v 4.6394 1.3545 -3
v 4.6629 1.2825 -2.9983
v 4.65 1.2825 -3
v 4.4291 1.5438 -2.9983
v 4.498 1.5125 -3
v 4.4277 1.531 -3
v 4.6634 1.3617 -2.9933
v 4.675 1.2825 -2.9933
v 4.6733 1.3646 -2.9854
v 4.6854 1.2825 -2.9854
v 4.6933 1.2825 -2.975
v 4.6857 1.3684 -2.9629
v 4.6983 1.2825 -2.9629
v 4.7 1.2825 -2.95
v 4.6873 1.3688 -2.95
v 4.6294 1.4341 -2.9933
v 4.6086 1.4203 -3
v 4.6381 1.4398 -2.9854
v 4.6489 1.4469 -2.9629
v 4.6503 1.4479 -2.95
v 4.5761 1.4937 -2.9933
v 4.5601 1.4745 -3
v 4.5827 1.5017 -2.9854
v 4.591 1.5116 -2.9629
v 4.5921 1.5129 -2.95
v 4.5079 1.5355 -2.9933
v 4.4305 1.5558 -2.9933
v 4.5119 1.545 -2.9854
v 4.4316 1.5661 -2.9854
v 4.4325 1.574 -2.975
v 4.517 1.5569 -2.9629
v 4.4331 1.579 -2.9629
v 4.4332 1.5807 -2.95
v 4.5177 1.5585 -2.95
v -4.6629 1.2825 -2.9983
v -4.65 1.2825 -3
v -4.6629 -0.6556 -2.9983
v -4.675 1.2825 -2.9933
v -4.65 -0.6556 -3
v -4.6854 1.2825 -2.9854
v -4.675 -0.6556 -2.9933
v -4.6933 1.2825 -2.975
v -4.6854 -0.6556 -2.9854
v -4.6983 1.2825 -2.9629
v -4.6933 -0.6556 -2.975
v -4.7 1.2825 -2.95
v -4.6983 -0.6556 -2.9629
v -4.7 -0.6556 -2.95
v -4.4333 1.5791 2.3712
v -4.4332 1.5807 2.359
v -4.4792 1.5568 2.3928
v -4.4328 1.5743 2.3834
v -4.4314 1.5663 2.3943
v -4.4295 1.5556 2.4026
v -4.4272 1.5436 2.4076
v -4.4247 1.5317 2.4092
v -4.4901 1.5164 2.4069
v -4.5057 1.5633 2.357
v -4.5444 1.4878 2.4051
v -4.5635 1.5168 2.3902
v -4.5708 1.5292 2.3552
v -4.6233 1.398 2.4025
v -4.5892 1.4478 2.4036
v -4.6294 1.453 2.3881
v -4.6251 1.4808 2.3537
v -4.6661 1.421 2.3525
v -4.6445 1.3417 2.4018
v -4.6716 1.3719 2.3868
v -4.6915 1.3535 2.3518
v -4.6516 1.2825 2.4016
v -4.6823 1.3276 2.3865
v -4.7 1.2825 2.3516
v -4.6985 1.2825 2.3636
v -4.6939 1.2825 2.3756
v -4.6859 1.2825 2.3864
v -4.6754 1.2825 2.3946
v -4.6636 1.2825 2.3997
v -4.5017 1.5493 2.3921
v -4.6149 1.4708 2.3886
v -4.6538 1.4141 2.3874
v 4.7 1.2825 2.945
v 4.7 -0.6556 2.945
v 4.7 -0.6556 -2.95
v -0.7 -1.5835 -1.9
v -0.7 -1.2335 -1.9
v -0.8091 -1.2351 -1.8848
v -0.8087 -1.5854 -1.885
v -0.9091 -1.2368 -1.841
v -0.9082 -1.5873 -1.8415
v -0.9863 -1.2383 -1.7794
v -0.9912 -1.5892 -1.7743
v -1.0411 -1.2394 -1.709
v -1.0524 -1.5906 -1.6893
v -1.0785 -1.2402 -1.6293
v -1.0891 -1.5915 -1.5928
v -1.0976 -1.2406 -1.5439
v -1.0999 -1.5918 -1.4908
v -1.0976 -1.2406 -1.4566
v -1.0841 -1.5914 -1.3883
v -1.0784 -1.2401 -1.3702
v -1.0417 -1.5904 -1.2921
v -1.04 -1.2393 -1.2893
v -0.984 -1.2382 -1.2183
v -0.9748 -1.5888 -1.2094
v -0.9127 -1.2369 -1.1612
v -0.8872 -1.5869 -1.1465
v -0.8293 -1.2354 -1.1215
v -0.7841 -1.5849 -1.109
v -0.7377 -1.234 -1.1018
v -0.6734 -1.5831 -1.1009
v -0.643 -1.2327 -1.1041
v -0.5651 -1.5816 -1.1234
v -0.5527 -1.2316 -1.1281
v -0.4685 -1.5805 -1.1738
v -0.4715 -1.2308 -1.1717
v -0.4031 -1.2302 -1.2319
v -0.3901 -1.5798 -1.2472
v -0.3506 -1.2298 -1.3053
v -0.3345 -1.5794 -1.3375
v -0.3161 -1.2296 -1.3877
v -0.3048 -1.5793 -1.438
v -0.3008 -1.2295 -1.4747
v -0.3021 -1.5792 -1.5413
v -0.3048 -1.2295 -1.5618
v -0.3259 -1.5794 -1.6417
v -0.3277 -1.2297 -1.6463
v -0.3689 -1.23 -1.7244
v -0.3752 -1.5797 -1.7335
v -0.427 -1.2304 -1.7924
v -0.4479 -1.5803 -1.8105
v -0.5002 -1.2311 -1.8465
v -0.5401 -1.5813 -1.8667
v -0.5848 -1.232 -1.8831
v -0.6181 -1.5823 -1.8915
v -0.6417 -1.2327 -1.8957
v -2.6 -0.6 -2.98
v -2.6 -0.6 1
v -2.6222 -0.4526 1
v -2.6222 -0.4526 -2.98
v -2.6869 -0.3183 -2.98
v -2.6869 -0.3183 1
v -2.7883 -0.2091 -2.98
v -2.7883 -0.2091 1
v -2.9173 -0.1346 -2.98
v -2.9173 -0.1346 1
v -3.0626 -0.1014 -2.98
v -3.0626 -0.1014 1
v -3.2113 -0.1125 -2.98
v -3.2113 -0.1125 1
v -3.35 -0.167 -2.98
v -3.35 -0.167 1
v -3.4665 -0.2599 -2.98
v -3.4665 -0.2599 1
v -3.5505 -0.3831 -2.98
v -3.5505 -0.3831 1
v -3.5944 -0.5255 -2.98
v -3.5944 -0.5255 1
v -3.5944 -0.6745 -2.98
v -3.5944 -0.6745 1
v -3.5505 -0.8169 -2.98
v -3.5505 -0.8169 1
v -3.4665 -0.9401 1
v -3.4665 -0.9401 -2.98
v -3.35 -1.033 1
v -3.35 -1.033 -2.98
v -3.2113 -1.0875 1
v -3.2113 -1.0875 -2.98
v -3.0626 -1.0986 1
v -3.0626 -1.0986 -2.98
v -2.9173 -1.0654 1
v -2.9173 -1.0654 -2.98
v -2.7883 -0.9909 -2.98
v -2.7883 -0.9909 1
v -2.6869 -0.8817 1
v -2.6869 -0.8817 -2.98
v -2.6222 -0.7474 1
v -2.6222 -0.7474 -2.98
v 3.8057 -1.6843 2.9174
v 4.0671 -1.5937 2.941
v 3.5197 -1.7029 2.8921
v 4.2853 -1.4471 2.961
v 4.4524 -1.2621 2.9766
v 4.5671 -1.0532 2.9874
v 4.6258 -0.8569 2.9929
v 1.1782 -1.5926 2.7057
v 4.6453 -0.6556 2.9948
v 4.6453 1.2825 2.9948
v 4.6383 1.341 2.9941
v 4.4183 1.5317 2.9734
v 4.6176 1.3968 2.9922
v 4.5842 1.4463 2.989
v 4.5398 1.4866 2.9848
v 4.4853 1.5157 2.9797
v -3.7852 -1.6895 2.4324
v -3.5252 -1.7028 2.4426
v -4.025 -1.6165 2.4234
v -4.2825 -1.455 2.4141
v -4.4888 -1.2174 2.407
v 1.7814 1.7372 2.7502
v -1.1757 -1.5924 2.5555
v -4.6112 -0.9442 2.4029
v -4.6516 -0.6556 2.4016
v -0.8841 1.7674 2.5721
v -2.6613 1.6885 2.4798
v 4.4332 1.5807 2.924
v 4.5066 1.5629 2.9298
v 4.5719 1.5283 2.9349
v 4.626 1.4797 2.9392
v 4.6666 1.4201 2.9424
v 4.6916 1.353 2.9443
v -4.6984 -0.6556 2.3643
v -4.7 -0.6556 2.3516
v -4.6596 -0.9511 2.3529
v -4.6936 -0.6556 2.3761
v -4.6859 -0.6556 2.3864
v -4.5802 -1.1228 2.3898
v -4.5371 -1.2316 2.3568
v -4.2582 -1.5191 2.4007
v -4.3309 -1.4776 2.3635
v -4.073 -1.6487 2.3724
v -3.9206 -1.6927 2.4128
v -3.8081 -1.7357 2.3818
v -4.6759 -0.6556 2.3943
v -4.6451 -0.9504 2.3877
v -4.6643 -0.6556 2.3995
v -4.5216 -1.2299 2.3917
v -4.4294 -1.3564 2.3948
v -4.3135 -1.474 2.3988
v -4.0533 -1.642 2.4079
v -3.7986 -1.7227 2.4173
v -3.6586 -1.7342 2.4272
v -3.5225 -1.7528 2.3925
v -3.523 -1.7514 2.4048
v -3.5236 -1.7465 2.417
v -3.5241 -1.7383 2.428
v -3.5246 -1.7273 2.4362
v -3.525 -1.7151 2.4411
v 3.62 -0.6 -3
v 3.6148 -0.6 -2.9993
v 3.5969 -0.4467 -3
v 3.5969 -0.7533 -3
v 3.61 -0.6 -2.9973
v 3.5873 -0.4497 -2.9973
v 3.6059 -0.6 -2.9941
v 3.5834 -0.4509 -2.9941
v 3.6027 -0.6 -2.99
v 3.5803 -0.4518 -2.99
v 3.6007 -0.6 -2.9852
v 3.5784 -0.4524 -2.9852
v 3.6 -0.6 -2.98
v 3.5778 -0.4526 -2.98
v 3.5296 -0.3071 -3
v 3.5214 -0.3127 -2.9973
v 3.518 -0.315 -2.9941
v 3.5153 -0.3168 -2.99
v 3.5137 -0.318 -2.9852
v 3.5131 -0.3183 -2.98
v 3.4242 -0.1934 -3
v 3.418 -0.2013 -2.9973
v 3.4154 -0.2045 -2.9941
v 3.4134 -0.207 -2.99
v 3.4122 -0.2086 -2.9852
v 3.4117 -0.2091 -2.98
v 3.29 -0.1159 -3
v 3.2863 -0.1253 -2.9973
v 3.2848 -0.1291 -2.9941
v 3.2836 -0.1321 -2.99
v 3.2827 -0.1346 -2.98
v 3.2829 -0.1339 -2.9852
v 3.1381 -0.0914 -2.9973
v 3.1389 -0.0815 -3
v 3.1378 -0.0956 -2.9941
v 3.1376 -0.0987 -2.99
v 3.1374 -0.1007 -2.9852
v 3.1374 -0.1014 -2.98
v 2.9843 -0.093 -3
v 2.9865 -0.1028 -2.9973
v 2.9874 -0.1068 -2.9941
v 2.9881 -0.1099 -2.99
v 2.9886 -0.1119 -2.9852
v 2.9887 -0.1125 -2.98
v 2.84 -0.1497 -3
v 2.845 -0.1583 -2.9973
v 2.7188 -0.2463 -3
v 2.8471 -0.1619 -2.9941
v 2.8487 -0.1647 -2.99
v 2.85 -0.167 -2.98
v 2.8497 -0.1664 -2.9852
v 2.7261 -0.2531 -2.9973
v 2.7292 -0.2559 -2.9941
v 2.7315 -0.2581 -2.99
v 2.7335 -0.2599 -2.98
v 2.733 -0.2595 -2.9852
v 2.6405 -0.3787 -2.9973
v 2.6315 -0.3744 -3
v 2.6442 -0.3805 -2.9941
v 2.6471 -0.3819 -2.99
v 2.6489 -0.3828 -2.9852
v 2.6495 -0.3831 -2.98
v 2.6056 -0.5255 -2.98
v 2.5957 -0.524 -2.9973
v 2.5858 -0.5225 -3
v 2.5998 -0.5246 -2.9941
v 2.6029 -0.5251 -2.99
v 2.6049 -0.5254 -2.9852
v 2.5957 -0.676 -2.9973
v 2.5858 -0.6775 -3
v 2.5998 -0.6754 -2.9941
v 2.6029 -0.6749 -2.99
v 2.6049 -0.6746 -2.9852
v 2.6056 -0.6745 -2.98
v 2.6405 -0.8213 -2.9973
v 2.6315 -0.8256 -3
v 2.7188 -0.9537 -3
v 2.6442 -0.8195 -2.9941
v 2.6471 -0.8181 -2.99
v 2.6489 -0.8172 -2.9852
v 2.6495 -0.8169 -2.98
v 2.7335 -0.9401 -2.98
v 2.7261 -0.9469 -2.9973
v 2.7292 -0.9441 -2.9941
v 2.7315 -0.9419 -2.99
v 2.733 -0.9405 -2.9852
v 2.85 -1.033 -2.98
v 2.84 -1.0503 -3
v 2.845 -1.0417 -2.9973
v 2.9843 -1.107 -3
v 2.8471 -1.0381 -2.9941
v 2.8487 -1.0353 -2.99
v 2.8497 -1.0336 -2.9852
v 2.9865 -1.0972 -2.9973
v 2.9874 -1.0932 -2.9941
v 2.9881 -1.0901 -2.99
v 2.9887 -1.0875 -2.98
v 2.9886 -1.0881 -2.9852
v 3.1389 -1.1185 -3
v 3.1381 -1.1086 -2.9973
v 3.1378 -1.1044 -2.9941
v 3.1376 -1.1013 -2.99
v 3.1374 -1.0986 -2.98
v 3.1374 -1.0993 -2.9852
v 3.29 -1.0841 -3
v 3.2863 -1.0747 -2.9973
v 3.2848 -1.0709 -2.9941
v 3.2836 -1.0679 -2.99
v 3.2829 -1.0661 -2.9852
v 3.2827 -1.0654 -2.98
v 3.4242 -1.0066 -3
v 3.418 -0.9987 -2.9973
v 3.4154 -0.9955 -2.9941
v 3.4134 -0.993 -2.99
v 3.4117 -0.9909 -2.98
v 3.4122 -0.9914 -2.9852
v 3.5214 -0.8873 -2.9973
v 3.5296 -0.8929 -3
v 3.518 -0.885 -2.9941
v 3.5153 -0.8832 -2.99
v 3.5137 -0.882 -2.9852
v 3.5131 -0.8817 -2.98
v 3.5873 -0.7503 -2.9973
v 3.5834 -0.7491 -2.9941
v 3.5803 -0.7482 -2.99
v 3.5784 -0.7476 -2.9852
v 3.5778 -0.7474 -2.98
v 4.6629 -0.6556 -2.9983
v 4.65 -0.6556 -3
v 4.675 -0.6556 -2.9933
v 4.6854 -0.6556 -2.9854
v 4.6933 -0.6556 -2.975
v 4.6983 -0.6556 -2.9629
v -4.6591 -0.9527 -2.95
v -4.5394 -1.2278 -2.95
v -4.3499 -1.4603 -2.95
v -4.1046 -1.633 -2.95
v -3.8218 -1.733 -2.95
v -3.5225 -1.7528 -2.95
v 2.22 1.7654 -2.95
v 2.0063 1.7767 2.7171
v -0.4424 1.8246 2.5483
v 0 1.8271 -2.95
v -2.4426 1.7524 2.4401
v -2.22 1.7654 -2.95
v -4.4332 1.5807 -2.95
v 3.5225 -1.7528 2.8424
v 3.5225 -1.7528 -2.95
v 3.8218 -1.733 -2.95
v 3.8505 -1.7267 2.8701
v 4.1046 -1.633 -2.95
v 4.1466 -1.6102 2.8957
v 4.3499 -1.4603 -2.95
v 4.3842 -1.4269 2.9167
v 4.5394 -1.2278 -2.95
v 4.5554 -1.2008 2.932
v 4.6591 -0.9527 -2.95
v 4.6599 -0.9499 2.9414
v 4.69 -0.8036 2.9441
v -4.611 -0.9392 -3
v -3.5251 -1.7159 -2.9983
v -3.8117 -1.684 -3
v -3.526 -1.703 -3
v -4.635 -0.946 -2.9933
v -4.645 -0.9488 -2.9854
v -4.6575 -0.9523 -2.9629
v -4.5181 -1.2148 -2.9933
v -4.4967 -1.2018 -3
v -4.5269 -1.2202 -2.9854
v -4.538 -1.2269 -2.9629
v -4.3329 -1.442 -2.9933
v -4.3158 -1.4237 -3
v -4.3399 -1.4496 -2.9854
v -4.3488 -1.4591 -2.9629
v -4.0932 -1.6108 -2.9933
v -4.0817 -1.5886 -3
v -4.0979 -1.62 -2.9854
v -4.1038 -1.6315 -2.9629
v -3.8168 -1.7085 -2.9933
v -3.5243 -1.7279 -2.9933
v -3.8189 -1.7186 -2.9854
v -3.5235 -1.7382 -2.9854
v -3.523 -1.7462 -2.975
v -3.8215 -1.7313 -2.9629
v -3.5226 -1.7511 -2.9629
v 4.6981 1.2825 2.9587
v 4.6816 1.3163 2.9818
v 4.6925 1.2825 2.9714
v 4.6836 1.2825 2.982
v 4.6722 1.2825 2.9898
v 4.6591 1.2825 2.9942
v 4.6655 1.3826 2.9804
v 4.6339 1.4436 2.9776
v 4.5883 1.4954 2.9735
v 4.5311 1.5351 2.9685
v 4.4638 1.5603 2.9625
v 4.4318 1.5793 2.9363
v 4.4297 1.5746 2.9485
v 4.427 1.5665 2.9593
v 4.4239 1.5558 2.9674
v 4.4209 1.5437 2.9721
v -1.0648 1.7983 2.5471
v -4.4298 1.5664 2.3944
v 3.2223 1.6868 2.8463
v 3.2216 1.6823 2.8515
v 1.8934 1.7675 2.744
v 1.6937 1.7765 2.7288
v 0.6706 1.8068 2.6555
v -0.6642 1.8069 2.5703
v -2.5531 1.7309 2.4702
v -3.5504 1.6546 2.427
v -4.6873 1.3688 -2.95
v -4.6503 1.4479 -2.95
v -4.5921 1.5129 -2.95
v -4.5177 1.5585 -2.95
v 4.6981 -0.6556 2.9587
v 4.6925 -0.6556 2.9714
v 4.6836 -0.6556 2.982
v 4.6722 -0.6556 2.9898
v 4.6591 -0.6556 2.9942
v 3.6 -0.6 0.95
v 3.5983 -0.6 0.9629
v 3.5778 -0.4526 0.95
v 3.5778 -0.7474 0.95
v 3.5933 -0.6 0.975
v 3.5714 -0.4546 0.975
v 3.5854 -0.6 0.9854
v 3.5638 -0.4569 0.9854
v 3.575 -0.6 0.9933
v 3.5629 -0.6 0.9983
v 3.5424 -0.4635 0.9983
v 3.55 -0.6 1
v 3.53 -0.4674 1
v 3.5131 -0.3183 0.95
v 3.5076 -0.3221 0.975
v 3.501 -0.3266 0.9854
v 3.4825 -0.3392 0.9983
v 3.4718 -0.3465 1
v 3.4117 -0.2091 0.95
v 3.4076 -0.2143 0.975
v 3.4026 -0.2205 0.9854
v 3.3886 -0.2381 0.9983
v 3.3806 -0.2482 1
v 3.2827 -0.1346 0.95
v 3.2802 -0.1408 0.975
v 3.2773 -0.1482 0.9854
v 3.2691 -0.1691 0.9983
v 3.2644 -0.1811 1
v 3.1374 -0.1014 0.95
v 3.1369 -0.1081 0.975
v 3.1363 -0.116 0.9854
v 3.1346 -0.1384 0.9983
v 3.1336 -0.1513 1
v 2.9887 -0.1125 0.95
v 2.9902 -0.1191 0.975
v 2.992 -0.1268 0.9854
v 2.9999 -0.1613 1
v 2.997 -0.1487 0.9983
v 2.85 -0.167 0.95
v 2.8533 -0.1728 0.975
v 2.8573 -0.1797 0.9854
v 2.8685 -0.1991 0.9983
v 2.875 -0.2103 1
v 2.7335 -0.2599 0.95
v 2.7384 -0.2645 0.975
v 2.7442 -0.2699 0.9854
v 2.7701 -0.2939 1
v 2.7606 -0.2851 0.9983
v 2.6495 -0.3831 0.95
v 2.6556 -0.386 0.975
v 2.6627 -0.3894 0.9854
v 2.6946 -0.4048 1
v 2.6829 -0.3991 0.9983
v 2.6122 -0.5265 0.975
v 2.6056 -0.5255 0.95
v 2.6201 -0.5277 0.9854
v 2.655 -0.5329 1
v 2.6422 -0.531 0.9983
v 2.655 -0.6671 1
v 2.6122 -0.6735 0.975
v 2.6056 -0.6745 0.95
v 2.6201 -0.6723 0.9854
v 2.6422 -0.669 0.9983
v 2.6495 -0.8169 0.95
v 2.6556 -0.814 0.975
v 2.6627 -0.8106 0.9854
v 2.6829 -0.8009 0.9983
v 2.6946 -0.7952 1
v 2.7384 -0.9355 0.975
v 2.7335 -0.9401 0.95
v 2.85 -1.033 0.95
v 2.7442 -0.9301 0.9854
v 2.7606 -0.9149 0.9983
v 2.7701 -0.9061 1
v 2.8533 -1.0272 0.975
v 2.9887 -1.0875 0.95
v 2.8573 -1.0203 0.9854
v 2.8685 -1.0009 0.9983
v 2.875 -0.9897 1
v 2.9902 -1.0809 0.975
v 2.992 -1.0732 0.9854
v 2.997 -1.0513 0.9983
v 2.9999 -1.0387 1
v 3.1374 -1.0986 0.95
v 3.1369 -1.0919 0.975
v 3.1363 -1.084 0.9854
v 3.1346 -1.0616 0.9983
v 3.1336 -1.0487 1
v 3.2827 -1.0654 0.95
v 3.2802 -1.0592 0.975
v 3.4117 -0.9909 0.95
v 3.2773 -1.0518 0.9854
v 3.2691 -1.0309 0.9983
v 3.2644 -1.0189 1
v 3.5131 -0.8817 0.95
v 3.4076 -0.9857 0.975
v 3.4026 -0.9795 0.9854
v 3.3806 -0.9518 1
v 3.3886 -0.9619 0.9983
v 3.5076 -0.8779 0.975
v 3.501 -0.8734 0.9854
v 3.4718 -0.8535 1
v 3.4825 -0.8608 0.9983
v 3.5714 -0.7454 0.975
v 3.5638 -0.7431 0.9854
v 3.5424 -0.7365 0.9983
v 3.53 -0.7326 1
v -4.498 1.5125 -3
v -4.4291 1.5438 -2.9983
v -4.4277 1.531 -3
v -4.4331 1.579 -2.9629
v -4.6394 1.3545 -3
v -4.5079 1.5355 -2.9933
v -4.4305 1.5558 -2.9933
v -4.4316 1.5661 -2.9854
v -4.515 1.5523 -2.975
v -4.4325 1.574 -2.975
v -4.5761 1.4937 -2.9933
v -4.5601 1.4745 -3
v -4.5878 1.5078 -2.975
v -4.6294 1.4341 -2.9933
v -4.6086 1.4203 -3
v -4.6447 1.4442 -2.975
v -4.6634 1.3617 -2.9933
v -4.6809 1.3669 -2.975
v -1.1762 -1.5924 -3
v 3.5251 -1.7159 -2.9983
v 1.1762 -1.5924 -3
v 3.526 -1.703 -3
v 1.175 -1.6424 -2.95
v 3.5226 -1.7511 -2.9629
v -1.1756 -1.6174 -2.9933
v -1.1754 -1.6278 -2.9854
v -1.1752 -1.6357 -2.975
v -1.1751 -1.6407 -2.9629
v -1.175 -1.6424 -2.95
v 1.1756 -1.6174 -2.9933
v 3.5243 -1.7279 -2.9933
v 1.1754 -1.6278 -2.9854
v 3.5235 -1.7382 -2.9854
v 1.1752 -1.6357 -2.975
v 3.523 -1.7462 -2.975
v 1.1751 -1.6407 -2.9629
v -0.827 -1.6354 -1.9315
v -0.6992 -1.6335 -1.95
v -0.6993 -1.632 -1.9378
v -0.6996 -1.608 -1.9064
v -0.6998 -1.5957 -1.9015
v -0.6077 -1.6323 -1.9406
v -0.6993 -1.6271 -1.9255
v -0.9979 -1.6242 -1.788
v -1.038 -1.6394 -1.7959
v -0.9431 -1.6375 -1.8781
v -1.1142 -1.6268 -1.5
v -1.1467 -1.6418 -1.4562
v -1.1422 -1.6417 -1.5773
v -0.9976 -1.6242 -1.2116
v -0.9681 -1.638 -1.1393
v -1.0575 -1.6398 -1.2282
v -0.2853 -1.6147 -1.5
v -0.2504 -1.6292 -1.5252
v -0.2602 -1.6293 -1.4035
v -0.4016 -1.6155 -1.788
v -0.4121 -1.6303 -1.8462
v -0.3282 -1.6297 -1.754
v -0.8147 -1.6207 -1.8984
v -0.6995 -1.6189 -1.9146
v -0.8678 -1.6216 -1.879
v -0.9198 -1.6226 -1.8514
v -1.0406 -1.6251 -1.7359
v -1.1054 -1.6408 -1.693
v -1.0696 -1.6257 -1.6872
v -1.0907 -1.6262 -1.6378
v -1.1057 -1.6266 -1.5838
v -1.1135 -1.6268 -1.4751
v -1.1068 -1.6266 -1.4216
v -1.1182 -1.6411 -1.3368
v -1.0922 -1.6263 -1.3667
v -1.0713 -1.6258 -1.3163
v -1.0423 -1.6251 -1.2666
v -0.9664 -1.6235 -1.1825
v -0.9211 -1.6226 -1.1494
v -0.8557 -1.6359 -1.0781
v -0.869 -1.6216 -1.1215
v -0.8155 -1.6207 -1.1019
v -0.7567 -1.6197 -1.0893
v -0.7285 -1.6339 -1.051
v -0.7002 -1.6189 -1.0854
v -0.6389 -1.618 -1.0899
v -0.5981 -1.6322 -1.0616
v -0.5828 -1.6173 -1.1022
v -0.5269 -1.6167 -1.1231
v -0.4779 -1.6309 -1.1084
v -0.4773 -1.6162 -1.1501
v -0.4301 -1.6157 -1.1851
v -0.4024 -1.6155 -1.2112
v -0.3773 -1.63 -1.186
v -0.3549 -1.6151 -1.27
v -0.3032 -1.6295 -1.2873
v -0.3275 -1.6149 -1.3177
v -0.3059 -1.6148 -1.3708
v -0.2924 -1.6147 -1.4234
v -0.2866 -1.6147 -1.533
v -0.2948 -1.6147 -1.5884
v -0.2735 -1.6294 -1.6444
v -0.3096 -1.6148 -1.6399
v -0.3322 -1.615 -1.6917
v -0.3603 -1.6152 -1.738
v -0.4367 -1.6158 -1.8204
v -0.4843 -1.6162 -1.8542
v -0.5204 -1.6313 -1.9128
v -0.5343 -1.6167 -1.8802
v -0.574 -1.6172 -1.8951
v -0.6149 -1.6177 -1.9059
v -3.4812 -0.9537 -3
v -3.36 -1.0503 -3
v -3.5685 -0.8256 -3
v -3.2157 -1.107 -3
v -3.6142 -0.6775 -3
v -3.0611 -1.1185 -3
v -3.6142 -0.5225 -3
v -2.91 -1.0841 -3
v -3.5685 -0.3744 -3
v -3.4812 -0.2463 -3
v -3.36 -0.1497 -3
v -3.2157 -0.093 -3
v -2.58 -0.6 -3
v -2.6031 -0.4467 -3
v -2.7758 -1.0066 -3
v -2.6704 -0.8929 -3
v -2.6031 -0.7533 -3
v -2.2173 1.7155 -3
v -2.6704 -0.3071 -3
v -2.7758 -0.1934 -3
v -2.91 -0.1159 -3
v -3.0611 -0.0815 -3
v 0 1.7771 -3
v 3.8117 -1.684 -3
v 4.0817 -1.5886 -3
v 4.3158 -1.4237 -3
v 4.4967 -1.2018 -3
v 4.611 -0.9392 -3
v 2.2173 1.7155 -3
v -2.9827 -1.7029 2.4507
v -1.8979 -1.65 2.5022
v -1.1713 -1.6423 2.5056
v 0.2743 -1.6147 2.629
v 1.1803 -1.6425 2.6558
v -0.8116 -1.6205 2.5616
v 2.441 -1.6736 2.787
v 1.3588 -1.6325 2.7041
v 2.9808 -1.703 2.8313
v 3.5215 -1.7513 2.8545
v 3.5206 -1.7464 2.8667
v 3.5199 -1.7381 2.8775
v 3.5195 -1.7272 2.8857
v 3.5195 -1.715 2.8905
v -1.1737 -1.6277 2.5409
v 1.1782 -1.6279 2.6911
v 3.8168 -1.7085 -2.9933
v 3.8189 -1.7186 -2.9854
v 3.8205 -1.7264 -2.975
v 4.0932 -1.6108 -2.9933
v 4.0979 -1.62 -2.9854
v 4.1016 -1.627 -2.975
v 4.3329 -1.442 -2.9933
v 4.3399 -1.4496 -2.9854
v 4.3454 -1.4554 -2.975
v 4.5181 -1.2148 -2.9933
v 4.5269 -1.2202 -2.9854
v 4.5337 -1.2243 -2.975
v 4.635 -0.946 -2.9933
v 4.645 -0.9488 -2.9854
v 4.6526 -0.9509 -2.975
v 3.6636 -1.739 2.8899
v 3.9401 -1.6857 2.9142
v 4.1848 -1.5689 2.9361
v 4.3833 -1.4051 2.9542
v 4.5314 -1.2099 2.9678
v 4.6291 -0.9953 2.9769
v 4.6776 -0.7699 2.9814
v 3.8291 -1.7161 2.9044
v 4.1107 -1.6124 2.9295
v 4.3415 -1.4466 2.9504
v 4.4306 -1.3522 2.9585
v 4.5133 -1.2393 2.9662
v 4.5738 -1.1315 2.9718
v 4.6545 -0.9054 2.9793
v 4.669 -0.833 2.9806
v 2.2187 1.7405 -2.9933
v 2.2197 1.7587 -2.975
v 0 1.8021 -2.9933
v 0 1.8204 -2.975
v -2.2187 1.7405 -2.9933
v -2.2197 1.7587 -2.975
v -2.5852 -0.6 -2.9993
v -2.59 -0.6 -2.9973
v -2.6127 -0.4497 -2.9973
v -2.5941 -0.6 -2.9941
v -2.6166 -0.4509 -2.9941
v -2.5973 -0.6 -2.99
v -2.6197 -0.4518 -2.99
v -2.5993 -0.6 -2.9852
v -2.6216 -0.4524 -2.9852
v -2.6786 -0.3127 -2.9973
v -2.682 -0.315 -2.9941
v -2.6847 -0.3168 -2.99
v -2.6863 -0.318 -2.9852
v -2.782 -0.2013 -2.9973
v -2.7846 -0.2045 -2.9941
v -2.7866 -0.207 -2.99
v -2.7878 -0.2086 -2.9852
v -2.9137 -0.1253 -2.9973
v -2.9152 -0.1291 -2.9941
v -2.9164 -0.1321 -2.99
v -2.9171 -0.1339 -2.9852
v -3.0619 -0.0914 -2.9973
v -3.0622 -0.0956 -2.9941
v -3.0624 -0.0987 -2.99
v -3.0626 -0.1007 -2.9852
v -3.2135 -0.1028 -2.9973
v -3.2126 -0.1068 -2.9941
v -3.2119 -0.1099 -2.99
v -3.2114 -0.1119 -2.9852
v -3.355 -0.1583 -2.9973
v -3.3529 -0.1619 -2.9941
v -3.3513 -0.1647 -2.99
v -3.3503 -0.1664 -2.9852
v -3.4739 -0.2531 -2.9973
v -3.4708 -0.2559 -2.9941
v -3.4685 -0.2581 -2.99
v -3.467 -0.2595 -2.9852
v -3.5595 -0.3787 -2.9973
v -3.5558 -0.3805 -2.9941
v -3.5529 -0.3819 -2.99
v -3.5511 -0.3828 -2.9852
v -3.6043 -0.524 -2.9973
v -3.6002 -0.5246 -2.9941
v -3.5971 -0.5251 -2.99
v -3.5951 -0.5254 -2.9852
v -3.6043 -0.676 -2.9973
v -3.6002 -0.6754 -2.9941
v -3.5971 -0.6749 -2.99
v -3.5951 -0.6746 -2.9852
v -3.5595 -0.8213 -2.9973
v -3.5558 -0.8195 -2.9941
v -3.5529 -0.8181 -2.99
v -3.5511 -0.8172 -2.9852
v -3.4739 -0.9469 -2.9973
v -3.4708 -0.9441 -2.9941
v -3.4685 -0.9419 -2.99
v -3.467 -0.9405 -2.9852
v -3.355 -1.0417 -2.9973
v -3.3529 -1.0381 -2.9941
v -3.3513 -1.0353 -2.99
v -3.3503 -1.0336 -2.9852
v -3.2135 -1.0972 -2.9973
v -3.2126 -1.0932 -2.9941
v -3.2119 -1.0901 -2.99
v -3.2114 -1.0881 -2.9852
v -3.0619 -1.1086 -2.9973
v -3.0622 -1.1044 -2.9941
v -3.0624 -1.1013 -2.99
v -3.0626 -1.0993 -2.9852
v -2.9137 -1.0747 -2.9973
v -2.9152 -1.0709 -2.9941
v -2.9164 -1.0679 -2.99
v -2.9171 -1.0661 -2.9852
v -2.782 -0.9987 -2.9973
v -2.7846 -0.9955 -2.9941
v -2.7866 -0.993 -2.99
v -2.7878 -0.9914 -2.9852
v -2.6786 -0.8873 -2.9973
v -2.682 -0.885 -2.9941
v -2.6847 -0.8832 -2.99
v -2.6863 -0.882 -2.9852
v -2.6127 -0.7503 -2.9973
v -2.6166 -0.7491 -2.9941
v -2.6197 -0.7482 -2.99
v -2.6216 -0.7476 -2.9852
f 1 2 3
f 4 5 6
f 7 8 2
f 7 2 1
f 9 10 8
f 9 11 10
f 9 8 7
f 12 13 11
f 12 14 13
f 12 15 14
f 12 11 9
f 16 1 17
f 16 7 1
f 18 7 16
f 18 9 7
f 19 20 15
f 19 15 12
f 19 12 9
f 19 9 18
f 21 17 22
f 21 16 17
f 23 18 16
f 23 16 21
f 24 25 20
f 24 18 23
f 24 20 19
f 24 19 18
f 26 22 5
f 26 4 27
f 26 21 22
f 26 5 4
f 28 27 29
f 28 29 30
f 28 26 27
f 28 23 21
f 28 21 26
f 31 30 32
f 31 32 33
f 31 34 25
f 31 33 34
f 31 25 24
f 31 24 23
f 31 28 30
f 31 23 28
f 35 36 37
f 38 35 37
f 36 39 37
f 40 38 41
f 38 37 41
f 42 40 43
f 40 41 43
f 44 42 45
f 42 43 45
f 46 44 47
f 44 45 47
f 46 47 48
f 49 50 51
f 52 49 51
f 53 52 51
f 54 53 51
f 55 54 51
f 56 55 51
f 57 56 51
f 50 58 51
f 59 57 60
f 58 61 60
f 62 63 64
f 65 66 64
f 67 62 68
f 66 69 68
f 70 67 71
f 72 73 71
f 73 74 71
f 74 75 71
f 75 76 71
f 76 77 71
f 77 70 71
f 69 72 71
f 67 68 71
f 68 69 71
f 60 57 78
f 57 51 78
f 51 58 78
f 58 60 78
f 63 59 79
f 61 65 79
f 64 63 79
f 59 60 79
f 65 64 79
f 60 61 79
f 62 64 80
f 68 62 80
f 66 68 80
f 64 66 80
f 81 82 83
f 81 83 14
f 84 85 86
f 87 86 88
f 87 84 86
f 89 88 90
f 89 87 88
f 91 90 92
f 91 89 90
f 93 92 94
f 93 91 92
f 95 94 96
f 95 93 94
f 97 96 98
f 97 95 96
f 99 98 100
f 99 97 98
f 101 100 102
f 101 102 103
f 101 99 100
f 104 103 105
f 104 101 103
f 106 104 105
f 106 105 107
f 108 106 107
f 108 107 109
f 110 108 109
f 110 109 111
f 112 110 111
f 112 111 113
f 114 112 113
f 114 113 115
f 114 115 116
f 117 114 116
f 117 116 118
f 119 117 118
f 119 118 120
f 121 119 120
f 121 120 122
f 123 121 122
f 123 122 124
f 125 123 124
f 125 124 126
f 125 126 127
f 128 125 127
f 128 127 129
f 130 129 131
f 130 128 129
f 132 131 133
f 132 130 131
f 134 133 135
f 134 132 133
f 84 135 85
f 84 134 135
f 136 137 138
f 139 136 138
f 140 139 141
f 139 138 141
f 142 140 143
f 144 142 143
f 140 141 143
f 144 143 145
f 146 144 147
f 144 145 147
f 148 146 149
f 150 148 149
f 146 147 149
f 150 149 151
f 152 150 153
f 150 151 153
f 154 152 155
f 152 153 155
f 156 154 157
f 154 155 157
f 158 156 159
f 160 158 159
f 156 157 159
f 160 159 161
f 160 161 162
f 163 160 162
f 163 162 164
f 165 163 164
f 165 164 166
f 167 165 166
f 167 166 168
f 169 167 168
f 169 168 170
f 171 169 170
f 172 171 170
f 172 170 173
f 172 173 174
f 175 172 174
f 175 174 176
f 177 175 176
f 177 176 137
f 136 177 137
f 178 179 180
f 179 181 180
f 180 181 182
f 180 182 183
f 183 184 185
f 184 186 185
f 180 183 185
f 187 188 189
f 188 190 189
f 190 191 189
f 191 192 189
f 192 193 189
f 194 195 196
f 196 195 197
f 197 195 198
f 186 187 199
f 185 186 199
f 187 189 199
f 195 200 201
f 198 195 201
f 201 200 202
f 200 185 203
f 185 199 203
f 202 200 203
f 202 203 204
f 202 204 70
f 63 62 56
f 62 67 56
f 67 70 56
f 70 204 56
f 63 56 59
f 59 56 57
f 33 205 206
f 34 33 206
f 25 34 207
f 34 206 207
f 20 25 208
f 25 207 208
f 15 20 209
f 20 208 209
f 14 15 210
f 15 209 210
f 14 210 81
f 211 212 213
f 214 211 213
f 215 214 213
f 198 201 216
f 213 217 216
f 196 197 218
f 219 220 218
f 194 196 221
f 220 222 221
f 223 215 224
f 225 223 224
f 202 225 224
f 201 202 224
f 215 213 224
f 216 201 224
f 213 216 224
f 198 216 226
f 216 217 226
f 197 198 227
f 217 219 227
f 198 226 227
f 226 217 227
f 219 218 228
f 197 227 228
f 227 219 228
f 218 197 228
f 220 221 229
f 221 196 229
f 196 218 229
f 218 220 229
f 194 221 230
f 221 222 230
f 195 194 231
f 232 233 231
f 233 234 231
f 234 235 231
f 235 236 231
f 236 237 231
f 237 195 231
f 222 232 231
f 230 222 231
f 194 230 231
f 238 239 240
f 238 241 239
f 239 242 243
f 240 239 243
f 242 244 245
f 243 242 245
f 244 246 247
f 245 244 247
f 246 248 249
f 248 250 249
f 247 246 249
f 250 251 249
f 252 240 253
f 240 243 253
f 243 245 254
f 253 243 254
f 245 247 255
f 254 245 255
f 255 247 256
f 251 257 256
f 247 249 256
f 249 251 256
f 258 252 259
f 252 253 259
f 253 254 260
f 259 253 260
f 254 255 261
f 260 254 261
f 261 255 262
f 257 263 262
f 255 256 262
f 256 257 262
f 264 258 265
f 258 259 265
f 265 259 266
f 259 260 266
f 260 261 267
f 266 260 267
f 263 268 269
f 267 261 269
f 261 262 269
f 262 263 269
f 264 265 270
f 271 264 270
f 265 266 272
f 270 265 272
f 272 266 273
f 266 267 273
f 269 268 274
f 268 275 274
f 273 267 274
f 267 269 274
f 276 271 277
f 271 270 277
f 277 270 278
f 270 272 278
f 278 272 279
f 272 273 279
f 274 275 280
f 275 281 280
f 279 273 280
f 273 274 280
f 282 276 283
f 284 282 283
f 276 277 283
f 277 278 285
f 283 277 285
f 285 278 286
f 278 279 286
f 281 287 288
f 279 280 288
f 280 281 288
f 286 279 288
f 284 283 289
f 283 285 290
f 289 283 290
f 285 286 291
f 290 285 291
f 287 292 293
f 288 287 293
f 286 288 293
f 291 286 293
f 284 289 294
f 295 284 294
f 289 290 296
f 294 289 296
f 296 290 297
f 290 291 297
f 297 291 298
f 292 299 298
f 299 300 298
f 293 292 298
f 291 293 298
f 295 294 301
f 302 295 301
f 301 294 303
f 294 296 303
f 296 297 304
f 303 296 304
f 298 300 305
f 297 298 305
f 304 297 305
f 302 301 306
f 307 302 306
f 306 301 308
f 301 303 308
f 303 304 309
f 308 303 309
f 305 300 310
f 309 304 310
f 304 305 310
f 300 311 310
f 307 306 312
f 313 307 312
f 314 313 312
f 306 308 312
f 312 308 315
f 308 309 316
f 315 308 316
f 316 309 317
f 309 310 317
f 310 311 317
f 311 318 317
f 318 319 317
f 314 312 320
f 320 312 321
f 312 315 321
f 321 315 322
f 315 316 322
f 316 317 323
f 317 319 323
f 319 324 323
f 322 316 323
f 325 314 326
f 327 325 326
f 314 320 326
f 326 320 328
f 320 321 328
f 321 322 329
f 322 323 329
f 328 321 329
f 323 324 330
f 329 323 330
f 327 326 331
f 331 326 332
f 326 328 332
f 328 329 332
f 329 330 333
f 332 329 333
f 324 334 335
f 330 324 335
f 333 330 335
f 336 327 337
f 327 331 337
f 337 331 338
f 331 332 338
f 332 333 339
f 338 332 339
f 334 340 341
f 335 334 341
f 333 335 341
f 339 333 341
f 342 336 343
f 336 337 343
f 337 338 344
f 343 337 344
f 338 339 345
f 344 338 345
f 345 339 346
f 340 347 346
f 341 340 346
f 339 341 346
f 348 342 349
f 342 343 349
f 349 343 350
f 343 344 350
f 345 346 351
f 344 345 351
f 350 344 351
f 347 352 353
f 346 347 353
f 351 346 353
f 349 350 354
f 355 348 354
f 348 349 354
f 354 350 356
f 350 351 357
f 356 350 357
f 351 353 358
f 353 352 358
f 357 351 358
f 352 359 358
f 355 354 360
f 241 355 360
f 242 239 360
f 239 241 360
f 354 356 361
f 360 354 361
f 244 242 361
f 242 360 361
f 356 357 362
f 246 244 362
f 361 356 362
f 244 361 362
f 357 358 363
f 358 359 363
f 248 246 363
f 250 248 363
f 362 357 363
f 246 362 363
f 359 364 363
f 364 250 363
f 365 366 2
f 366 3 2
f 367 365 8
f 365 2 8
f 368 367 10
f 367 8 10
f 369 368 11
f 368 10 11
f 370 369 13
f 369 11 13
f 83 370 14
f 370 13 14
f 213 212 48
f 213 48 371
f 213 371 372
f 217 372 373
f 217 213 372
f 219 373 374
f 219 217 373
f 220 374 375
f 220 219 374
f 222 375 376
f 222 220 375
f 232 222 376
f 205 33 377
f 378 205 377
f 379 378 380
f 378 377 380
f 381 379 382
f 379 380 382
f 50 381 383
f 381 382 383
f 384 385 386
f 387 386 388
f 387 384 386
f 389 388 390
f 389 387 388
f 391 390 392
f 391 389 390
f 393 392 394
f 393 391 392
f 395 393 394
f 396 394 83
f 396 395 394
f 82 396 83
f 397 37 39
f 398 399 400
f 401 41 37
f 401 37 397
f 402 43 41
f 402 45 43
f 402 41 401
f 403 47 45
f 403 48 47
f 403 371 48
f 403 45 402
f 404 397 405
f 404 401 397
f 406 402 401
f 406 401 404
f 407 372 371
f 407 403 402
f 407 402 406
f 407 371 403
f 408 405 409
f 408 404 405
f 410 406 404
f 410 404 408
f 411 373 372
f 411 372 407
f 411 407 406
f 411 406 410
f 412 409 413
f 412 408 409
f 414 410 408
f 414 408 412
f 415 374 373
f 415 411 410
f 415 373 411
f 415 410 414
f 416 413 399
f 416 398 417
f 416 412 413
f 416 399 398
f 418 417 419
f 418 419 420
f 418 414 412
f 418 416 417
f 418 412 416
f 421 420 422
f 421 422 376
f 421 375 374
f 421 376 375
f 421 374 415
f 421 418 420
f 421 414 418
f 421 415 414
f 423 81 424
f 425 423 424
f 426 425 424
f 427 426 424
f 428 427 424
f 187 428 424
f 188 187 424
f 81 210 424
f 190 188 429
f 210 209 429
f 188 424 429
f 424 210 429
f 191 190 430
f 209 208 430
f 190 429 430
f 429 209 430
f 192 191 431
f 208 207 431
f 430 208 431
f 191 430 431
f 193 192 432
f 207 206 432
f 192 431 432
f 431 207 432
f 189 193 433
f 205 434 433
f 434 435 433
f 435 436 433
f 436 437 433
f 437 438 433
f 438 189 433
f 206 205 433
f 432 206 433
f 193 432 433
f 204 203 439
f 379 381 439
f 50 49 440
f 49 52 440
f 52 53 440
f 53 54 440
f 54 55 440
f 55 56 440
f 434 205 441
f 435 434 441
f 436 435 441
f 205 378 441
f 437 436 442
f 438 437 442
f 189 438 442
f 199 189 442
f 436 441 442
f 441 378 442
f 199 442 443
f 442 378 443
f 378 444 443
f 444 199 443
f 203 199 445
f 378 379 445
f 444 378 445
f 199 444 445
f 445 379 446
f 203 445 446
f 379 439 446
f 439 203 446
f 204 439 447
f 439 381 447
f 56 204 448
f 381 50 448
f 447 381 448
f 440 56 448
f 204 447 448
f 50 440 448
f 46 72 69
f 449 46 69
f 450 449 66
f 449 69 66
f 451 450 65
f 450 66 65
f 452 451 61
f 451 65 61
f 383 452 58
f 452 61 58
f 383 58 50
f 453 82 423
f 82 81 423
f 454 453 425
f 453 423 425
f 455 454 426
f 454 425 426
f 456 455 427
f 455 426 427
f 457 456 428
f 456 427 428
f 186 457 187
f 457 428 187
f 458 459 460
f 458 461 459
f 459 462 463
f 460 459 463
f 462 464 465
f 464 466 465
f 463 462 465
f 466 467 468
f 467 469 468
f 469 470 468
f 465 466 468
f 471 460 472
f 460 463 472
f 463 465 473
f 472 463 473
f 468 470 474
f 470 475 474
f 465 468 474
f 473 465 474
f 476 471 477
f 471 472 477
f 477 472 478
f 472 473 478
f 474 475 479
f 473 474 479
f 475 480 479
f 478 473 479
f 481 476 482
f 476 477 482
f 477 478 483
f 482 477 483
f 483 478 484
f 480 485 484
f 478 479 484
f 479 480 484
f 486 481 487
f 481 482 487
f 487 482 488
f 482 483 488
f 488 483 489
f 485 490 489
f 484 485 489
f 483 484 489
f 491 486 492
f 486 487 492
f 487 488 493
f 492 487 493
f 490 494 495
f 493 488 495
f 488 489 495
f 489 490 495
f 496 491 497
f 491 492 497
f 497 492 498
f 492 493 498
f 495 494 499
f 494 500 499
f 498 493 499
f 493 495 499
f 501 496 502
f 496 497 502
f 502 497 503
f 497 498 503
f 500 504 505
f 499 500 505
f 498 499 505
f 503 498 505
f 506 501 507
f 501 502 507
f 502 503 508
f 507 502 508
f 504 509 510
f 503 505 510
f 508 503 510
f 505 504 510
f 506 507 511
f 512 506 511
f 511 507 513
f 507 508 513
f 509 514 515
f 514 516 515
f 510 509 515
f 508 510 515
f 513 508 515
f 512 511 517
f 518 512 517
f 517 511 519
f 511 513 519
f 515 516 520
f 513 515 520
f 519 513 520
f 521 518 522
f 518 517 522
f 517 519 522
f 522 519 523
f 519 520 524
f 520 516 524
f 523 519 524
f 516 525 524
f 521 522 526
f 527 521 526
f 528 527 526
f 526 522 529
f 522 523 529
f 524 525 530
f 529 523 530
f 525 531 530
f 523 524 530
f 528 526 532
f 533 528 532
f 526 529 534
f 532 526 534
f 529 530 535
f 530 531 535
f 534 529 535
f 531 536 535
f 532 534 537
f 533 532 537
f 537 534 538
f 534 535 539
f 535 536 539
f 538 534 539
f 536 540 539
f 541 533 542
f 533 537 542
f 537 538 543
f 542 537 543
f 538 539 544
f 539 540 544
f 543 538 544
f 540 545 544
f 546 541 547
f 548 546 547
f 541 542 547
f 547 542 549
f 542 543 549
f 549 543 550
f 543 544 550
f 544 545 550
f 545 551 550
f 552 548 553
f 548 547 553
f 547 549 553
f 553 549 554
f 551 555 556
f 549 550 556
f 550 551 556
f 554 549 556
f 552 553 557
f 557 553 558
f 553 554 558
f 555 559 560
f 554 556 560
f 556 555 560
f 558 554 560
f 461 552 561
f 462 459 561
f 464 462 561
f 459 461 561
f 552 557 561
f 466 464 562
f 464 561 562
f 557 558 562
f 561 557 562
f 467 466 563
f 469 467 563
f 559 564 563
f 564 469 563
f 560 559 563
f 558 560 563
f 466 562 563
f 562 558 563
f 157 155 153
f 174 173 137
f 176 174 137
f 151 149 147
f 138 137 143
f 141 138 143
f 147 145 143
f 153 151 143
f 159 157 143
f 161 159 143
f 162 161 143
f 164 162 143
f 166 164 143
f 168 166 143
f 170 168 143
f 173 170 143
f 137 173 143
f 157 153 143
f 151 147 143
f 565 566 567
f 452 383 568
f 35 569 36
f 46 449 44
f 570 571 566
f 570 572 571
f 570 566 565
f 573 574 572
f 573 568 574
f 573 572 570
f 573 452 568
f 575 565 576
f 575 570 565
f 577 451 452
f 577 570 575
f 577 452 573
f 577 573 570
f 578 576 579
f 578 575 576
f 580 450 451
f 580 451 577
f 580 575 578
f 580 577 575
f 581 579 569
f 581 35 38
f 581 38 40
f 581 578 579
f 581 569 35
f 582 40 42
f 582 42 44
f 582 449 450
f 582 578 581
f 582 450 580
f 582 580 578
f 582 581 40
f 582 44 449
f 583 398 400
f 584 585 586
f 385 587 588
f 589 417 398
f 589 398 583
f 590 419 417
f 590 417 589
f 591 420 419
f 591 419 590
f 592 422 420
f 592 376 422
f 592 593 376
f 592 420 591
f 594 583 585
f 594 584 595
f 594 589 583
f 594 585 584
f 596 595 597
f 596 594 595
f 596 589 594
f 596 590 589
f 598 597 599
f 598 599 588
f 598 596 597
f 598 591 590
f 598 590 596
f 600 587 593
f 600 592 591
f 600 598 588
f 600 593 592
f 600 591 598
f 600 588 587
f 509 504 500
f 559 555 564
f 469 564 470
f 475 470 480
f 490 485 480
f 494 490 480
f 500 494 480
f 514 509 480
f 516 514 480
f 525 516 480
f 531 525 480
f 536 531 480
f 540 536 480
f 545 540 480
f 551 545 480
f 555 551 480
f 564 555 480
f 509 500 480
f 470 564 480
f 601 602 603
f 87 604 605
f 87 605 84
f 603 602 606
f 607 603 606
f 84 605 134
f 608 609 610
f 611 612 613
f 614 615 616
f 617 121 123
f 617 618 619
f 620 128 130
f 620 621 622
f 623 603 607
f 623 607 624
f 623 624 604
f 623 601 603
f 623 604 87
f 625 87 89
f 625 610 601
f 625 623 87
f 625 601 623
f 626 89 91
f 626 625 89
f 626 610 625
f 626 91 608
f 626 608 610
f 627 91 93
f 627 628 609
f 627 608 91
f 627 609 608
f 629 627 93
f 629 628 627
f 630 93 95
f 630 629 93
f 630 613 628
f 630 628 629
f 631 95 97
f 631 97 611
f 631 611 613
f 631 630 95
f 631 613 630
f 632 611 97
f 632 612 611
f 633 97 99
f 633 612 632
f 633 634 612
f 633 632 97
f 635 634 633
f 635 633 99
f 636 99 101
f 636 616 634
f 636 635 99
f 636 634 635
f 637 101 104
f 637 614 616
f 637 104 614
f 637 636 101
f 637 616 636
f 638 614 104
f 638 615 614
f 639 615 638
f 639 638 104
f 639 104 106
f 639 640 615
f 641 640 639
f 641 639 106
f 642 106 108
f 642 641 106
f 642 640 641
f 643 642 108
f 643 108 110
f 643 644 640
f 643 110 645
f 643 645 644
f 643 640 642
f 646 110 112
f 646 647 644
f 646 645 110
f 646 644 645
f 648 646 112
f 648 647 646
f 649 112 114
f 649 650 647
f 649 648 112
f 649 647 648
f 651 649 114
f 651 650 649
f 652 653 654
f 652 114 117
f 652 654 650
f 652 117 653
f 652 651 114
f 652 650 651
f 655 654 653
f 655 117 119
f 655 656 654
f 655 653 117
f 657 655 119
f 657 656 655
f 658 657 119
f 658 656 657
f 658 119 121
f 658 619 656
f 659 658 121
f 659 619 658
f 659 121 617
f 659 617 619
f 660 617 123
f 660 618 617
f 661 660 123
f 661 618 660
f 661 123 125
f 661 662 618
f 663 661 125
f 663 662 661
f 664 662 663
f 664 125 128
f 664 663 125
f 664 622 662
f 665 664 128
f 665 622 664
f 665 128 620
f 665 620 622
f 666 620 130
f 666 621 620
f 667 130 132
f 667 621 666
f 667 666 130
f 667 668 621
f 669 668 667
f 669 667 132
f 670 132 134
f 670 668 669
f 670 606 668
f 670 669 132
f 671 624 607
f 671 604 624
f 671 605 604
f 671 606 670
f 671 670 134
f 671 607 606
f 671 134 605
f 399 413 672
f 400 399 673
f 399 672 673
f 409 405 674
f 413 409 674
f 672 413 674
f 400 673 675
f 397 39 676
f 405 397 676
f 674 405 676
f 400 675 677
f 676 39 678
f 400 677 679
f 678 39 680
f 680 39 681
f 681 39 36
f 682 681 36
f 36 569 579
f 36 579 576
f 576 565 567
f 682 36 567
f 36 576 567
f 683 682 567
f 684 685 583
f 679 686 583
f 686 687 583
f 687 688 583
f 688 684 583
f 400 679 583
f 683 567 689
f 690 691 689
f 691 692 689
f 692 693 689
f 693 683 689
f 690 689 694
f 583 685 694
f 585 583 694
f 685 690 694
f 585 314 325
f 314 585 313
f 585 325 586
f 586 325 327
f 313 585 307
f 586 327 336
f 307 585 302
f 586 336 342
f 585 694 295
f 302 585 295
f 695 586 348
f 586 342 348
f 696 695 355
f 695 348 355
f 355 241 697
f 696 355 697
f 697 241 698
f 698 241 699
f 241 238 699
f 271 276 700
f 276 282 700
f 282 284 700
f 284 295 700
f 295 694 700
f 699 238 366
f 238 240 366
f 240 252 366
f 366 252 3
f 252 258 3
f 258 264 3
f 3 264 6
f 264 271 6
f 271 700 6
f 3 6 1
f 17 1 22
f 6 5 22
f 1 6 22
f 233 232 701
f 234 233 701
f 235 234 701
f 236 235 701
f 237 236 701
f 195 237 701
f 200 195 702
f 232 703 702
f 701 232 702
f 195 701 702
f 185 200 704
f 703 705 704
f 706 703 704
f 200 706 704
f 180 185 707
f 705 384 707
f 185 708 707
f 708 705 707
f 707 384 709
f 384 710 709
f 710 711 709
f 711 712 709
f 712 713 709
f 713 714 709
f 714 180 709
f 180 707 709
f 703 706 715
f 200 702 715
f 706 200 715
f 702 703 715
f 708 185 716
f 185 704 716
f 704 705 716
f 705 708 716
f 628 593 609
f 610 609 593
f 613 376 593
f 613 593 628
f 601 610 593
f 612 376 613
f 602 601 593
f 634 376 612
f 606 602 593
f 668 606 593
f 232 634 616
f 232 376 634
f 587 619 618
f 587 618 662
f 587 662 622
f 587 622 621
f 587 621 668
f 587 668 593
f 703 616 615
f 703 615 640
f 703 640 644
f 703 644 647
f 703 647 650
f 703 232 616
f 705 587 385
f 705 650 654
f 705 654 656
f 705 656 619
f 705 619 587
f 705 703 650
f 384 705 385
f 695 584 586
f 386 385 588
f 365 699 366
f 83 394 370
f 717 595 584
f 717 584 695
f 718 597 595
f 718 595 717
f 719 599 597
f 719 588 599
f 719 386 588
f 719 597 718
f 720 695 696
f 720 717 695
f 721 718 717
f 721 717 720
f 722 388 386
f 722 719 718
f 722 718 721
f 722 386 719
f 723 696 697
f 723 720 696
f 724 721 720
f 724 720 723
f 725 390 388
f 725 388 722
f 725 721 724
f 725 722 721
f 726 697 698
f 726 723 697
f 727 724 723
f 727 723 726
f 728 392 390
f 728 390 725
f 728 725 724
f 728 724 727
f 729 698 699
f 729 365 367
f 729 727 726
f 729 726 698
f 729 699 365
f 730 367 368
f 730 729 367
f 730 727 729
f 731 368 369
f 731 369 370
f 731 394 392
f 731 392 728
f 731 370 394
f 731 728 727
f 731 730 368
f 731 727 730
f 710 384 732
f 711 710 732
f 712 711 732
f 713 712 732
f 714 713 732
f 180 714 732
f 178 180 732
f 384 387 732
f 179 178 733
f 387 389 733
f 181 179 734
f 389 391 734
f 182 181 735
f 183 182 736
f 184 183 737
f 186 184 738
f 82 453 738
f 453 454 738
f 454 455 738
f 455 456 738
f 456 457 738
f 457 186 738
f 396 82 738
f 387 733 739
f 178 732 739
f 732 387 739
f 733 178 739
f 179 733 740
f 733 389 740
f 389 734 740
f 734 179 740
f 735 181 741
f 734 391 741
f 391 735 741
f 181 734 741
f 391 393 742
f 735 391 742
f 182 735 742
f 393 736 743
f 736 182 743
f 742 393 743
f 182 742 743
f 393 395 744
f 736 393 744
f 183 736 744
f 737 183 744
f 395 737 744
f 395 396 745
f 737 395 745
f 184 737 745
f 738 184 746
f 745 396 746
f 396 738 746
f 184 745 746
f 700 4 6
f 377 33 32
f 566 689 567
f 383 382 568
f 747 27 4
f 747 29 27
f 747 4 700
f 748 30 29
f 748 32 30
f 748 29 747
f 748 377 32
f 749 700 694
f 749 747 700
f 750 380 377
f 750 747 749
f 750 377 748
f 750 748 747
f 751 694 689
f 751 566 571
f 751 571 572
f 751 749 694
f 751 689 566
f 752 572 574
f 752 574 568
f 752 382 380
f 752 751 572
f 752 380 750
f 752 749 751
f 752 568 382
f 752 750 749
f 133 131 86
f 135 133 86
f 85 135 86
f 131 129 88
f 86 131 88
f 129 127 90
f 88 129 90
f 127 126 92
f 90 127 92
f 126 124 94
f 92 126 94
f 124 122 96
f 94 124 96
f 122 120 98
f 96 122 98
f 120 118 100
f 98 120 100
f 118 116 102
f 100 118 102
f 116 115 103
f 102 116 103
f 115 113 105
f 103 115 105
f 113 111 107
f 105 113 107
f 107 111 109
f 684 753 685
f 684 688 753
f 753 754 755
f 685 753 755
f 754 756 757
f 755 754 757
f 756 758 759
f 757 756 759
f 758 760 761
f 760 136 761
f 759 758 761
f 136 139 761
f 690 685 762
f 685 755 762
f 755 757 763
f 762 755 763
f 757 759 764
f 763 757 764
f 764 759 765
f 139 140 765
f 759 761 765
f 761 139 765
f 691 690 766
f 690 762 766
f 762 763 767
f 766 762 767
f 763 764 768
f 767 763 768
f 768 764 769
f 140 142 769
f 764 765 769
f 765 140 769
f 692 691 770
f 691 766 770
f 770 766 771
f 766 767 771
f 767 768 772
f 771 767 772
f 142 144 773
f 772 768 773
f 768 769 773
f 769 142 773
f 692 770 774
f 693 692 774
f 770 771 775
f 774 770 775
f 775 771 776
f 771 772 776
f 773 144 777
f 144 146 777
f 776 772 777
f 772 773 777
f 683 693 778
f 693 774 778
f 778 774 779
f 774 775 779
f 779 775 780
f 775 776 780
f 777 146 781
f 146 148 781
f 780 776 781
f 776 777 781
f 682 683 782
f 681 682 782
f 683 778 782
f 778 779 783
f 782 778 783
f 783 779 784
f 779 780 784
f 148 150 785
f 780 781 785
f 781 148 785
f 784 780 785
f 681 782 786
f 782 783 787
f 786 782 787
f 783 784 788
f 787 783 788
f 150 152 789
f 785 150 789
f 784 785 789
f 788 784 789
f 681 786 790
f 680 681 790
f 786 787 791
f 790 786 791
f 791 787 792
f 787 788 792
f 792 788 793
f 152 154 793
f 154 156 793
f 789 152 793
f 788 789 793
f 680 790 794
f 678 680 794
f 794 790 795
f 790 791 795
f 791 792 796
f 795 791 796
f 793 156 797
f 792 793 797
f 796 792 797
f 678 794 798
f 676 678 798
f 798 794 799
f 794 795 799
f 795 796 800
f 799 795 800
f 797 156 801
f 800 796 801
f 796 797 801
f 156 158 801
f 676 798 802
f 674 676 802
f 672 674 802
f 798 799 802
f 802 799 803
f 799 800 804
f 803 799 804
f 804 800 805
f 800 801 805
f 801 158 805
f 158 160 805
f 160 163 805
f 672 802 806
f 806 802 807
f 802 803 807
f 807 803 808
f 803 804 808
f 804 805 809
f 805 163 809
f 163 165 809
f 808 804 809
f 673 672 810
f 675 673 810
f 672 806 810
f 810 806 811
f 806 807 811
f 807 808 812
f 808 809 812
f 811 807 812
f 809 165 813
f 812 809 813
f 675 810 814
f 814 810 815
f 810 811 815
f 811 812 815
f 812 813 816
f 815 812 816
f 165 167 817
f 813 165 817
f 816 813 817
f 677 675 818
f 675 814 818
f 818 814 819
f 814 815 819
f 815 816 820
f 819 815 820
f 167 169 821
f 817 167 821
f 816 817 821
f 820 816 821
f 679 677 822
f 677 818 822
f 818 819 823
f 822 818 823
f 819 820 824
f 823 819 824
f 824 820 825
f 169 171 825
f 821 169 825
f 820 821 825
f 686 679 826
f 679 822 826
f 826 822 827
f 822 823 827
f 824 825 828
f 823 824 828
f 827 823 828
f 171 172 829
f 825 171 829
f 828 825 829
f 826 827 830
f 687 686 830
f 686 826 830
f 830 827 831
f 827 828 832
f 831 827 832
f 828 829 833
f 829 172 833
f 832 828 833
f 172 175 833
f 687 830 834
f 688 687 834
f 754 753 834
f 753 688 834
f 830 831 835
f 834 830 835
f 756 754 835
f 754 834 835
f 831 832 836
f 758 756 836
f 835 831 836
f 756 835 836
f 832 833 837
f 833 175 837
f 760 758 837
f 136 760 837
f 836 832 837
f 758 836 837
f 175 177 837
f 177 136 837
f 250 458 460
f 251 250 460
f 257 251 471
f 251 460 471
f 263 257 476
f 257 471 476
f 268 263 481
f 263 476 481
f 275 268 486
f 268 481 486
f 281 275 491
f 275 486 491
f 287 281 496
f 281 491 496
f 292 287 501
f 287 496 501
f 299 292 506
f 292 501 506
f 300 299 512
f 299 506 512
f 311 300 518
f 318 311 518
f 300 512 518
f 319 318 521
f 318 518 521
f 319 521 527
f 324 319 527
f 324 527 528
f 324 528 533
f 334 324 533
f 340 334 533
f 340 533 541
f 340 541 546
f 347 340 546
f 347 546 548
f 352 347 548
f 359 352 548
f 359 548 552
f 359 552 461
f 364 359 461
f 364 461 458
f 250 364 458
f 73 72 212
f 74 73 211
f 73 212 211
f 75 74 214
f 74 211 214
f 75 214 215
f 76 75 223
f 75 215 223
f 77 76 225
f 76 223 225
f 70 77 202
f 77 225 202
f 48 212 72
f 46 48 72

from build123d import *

# Parameters (mm, degrees)
SKETCH1_W               = 9.4
SKETCH1_H               = 3.7
BOSS_EXTRUDE1_DEPTH     = 3
CUT_EXTRUDE1_DEPTH      = 7.8
FILLET1_R               = 1.1
FILLET2_R               = 0.3
CUT_EXTRUDE2_START      = -2
SKETCH3_R               = 0.5
CUT_EXTRUDE2_DEPTH      = 13
FILLET4_R               = 0.02
CUT_EXTRUDE3_DEPTH      = 5
FILLET5_R               = 0.05
CUT_EXTRUDE4_REACH      = 17.868
CUT_EXTRUDE4_END_RADIUS = 50.4
CUT_EXTRUDE4_START      = -10
SKETCH5_R               = 0.4
FILLET6_R               = 0.05


with BuildPart() as part:
    # Sketch1 → Boss-Extrude1 (new, symmetric)
    with BuildSketch(Plane.XY):
        Rectangle(SKETCH1_W, SKETCH1_H)
    extrude(amount=BOSS_EXTRUDE1_DEPTH, both=True)

    # Sketch2 → Cut-Extrude1 (cut, symmetric)
    with BuildSketch(Plane.XY.offset(3)):
        with BuildLine():
            Line((-4.7, 1.55), (-7.120690005, 4.011417256))
            Line((-7.120690005, 4.011417256), (5.535860742, 3.886722174))
            Line((5.535860742, 3.886722174), (4.7, 1.55))
            ThreePointArc((4.7, 1.55), (0, 1.827084699), (-4.7, 1.55))
        make_face()
        with BuildLine():
            Line((4.7, -1.85), (0.350623614, -3.782025322))
            Line((0.350623614, -3.782025322), (-4.7, -1.85))
            ThreePointArc((-4.7, -1.85), (0, -1.628609864), (4.7, -1.85))
        make_face()
    extrude(amount=CUT_EXTRUDE1_DEPTH, both=True, mode=Mode.SUBTRACT)

    # Fillet1
    fillet1_edges = [part.edges().sort_by_distance(p)[0] for p in [
        (4.7, -1.85, 0),
        (-4.7, -1.85, 0),
    ]]
    fillet(fillet1_edges, radius=FILLET1_R)

    # Fillet2
    fillet2_edges = [part.edges().sort_by_distance(p)[0] for p in [
        (4.7, 1.55, 0),
        (-4.7, 1.55, 0),
    ]]
    fillet(fillet2_edges, radius=FILLET2_R)

    # Sketch3 → Cut-Extrude2 (cut)
    with BuildSketch(Plane.XY.offset(3).offset(CUT_EXTRUDE2_START)):
        with Locations((3.1, -0.6)):
            Circle(SKETCH3_R)
        with Locations((-3.1, -0.6)):
            Circle(SKETCH3_R)
    extrude(amount=-CUT_EXTRUDE2_DEPTH, mode=Mode.SUBTRACT)

    # Fillet4
    fillet4_edges = [part.edges().sort_by_distance(p)[0] for p in [
        (2.6, -0.6, -3),
        (-3.6, -0.6, -3),
    ]]
    fillet(fillet4_edges, radius=FILLET4_R)

    # Sketch4 → Cut-Extrude3 (cut, symmetric)
    with BuildSketch(Plane(origin=(0, 0, 0), x_dir=(1, 0, 0), z_dir=(0, 1, 0))):
        with BuildLine():
            Line((6.420677859, -4.774089961), (4.7, -3))
            ThreePointArc((4.7, -3), (0.004710726, -2.626198627), (-4.7, -2.4))
            Line((-4.7, -2.4), (-6.612719149, -3.913907535))
            Line((-6.612719149, -3.913907535), (6.420677859, -4.774089961))
        make_face()
    extrude(amount=CUT_EXTRUDE3_DEPTH, both=True, mode=Mode.SUBTRACT)

    # Fillet5
    fillet5_edges = [part.edges().sort_by_distance(p)[0] for p in [
        (4.7, 0.3134624, -3),
        (4.7, 0.3134624, 3),
        (0, -1.628609864, -3),
        (-4.349918456, -1.460327621, -3),
        (4.349918456, -1.460327621, -3),
        (0, 1.827084699, -3),
        (-4.7, 0.3134624, -3),
        (-4.623578634, 1.482534062, -3),
        (4.623578634, 1.482534062, -3),
        (2.6, -0.6, 1),
        (-4.623553452, 1.482562201, 2.402492735),
        (4.349071601, -1.461115946, 2.966925627),
        (-4.349757648, -1.460477444, 2.41174073),
        (4.623384041, 1.482751345, 2.992708087),
        (0.002641899, -1.628609931, 2.626066603),
        (-4.7, 0.3134624, 2.4),
        (0.004177998, 1.827084481, 2.626164624),
    ]]
    fillet(fillet5_edges, radius=FILLET5_R)

    # Cut-Extrude4: up to this cylinder (the profile starts inside it)
    cut_extrude4_end = Plane(origin=(0, -51.628609864, -1.5), z_dir=(0, 0, 1)) * Cylinder(CUT_EXTRUDE4_END_RADIUS, 137.536, mode=Mode.PRIVATE)
    # Sketch5 → Cut-Extrude4 (cut, up to the surface)
    with BuildSketch(Plane(origin=(0, 0, 0), x_dir=(1, 0, 0), z_dir=(0, 1, 0)).offset(CUT_EXTRUDE4_START), mode=Mode.PRIVATE) as cut_extrude4_sk1:
        with Locations(Location((-0.7, 1.5, 0), (0, 0, 90))):
            Circle(SKETCH5_R)
    cut_extrude4_tool1 = extrude(cut_extrude4_sk1.sketch, amount=CUT_EXTRUDE4_REACH, mode=Mode.PRIVATE) & cut_extrude4_end
    add(cut_extrude4_tool1.solids().sort_by_distance((-0.7, -10, -1.5))[0], mode=Mode.SUBTRACT)

    # Fillet6
    fillet6_edges = [part.edges().sort_by_distance(p)[0] for p in [
        (-0.700029875, -1.633510522, -1.100000001),
    ]]
    fillet(fillet6_edges, radius=FILLET6_R)


solid = part.part
